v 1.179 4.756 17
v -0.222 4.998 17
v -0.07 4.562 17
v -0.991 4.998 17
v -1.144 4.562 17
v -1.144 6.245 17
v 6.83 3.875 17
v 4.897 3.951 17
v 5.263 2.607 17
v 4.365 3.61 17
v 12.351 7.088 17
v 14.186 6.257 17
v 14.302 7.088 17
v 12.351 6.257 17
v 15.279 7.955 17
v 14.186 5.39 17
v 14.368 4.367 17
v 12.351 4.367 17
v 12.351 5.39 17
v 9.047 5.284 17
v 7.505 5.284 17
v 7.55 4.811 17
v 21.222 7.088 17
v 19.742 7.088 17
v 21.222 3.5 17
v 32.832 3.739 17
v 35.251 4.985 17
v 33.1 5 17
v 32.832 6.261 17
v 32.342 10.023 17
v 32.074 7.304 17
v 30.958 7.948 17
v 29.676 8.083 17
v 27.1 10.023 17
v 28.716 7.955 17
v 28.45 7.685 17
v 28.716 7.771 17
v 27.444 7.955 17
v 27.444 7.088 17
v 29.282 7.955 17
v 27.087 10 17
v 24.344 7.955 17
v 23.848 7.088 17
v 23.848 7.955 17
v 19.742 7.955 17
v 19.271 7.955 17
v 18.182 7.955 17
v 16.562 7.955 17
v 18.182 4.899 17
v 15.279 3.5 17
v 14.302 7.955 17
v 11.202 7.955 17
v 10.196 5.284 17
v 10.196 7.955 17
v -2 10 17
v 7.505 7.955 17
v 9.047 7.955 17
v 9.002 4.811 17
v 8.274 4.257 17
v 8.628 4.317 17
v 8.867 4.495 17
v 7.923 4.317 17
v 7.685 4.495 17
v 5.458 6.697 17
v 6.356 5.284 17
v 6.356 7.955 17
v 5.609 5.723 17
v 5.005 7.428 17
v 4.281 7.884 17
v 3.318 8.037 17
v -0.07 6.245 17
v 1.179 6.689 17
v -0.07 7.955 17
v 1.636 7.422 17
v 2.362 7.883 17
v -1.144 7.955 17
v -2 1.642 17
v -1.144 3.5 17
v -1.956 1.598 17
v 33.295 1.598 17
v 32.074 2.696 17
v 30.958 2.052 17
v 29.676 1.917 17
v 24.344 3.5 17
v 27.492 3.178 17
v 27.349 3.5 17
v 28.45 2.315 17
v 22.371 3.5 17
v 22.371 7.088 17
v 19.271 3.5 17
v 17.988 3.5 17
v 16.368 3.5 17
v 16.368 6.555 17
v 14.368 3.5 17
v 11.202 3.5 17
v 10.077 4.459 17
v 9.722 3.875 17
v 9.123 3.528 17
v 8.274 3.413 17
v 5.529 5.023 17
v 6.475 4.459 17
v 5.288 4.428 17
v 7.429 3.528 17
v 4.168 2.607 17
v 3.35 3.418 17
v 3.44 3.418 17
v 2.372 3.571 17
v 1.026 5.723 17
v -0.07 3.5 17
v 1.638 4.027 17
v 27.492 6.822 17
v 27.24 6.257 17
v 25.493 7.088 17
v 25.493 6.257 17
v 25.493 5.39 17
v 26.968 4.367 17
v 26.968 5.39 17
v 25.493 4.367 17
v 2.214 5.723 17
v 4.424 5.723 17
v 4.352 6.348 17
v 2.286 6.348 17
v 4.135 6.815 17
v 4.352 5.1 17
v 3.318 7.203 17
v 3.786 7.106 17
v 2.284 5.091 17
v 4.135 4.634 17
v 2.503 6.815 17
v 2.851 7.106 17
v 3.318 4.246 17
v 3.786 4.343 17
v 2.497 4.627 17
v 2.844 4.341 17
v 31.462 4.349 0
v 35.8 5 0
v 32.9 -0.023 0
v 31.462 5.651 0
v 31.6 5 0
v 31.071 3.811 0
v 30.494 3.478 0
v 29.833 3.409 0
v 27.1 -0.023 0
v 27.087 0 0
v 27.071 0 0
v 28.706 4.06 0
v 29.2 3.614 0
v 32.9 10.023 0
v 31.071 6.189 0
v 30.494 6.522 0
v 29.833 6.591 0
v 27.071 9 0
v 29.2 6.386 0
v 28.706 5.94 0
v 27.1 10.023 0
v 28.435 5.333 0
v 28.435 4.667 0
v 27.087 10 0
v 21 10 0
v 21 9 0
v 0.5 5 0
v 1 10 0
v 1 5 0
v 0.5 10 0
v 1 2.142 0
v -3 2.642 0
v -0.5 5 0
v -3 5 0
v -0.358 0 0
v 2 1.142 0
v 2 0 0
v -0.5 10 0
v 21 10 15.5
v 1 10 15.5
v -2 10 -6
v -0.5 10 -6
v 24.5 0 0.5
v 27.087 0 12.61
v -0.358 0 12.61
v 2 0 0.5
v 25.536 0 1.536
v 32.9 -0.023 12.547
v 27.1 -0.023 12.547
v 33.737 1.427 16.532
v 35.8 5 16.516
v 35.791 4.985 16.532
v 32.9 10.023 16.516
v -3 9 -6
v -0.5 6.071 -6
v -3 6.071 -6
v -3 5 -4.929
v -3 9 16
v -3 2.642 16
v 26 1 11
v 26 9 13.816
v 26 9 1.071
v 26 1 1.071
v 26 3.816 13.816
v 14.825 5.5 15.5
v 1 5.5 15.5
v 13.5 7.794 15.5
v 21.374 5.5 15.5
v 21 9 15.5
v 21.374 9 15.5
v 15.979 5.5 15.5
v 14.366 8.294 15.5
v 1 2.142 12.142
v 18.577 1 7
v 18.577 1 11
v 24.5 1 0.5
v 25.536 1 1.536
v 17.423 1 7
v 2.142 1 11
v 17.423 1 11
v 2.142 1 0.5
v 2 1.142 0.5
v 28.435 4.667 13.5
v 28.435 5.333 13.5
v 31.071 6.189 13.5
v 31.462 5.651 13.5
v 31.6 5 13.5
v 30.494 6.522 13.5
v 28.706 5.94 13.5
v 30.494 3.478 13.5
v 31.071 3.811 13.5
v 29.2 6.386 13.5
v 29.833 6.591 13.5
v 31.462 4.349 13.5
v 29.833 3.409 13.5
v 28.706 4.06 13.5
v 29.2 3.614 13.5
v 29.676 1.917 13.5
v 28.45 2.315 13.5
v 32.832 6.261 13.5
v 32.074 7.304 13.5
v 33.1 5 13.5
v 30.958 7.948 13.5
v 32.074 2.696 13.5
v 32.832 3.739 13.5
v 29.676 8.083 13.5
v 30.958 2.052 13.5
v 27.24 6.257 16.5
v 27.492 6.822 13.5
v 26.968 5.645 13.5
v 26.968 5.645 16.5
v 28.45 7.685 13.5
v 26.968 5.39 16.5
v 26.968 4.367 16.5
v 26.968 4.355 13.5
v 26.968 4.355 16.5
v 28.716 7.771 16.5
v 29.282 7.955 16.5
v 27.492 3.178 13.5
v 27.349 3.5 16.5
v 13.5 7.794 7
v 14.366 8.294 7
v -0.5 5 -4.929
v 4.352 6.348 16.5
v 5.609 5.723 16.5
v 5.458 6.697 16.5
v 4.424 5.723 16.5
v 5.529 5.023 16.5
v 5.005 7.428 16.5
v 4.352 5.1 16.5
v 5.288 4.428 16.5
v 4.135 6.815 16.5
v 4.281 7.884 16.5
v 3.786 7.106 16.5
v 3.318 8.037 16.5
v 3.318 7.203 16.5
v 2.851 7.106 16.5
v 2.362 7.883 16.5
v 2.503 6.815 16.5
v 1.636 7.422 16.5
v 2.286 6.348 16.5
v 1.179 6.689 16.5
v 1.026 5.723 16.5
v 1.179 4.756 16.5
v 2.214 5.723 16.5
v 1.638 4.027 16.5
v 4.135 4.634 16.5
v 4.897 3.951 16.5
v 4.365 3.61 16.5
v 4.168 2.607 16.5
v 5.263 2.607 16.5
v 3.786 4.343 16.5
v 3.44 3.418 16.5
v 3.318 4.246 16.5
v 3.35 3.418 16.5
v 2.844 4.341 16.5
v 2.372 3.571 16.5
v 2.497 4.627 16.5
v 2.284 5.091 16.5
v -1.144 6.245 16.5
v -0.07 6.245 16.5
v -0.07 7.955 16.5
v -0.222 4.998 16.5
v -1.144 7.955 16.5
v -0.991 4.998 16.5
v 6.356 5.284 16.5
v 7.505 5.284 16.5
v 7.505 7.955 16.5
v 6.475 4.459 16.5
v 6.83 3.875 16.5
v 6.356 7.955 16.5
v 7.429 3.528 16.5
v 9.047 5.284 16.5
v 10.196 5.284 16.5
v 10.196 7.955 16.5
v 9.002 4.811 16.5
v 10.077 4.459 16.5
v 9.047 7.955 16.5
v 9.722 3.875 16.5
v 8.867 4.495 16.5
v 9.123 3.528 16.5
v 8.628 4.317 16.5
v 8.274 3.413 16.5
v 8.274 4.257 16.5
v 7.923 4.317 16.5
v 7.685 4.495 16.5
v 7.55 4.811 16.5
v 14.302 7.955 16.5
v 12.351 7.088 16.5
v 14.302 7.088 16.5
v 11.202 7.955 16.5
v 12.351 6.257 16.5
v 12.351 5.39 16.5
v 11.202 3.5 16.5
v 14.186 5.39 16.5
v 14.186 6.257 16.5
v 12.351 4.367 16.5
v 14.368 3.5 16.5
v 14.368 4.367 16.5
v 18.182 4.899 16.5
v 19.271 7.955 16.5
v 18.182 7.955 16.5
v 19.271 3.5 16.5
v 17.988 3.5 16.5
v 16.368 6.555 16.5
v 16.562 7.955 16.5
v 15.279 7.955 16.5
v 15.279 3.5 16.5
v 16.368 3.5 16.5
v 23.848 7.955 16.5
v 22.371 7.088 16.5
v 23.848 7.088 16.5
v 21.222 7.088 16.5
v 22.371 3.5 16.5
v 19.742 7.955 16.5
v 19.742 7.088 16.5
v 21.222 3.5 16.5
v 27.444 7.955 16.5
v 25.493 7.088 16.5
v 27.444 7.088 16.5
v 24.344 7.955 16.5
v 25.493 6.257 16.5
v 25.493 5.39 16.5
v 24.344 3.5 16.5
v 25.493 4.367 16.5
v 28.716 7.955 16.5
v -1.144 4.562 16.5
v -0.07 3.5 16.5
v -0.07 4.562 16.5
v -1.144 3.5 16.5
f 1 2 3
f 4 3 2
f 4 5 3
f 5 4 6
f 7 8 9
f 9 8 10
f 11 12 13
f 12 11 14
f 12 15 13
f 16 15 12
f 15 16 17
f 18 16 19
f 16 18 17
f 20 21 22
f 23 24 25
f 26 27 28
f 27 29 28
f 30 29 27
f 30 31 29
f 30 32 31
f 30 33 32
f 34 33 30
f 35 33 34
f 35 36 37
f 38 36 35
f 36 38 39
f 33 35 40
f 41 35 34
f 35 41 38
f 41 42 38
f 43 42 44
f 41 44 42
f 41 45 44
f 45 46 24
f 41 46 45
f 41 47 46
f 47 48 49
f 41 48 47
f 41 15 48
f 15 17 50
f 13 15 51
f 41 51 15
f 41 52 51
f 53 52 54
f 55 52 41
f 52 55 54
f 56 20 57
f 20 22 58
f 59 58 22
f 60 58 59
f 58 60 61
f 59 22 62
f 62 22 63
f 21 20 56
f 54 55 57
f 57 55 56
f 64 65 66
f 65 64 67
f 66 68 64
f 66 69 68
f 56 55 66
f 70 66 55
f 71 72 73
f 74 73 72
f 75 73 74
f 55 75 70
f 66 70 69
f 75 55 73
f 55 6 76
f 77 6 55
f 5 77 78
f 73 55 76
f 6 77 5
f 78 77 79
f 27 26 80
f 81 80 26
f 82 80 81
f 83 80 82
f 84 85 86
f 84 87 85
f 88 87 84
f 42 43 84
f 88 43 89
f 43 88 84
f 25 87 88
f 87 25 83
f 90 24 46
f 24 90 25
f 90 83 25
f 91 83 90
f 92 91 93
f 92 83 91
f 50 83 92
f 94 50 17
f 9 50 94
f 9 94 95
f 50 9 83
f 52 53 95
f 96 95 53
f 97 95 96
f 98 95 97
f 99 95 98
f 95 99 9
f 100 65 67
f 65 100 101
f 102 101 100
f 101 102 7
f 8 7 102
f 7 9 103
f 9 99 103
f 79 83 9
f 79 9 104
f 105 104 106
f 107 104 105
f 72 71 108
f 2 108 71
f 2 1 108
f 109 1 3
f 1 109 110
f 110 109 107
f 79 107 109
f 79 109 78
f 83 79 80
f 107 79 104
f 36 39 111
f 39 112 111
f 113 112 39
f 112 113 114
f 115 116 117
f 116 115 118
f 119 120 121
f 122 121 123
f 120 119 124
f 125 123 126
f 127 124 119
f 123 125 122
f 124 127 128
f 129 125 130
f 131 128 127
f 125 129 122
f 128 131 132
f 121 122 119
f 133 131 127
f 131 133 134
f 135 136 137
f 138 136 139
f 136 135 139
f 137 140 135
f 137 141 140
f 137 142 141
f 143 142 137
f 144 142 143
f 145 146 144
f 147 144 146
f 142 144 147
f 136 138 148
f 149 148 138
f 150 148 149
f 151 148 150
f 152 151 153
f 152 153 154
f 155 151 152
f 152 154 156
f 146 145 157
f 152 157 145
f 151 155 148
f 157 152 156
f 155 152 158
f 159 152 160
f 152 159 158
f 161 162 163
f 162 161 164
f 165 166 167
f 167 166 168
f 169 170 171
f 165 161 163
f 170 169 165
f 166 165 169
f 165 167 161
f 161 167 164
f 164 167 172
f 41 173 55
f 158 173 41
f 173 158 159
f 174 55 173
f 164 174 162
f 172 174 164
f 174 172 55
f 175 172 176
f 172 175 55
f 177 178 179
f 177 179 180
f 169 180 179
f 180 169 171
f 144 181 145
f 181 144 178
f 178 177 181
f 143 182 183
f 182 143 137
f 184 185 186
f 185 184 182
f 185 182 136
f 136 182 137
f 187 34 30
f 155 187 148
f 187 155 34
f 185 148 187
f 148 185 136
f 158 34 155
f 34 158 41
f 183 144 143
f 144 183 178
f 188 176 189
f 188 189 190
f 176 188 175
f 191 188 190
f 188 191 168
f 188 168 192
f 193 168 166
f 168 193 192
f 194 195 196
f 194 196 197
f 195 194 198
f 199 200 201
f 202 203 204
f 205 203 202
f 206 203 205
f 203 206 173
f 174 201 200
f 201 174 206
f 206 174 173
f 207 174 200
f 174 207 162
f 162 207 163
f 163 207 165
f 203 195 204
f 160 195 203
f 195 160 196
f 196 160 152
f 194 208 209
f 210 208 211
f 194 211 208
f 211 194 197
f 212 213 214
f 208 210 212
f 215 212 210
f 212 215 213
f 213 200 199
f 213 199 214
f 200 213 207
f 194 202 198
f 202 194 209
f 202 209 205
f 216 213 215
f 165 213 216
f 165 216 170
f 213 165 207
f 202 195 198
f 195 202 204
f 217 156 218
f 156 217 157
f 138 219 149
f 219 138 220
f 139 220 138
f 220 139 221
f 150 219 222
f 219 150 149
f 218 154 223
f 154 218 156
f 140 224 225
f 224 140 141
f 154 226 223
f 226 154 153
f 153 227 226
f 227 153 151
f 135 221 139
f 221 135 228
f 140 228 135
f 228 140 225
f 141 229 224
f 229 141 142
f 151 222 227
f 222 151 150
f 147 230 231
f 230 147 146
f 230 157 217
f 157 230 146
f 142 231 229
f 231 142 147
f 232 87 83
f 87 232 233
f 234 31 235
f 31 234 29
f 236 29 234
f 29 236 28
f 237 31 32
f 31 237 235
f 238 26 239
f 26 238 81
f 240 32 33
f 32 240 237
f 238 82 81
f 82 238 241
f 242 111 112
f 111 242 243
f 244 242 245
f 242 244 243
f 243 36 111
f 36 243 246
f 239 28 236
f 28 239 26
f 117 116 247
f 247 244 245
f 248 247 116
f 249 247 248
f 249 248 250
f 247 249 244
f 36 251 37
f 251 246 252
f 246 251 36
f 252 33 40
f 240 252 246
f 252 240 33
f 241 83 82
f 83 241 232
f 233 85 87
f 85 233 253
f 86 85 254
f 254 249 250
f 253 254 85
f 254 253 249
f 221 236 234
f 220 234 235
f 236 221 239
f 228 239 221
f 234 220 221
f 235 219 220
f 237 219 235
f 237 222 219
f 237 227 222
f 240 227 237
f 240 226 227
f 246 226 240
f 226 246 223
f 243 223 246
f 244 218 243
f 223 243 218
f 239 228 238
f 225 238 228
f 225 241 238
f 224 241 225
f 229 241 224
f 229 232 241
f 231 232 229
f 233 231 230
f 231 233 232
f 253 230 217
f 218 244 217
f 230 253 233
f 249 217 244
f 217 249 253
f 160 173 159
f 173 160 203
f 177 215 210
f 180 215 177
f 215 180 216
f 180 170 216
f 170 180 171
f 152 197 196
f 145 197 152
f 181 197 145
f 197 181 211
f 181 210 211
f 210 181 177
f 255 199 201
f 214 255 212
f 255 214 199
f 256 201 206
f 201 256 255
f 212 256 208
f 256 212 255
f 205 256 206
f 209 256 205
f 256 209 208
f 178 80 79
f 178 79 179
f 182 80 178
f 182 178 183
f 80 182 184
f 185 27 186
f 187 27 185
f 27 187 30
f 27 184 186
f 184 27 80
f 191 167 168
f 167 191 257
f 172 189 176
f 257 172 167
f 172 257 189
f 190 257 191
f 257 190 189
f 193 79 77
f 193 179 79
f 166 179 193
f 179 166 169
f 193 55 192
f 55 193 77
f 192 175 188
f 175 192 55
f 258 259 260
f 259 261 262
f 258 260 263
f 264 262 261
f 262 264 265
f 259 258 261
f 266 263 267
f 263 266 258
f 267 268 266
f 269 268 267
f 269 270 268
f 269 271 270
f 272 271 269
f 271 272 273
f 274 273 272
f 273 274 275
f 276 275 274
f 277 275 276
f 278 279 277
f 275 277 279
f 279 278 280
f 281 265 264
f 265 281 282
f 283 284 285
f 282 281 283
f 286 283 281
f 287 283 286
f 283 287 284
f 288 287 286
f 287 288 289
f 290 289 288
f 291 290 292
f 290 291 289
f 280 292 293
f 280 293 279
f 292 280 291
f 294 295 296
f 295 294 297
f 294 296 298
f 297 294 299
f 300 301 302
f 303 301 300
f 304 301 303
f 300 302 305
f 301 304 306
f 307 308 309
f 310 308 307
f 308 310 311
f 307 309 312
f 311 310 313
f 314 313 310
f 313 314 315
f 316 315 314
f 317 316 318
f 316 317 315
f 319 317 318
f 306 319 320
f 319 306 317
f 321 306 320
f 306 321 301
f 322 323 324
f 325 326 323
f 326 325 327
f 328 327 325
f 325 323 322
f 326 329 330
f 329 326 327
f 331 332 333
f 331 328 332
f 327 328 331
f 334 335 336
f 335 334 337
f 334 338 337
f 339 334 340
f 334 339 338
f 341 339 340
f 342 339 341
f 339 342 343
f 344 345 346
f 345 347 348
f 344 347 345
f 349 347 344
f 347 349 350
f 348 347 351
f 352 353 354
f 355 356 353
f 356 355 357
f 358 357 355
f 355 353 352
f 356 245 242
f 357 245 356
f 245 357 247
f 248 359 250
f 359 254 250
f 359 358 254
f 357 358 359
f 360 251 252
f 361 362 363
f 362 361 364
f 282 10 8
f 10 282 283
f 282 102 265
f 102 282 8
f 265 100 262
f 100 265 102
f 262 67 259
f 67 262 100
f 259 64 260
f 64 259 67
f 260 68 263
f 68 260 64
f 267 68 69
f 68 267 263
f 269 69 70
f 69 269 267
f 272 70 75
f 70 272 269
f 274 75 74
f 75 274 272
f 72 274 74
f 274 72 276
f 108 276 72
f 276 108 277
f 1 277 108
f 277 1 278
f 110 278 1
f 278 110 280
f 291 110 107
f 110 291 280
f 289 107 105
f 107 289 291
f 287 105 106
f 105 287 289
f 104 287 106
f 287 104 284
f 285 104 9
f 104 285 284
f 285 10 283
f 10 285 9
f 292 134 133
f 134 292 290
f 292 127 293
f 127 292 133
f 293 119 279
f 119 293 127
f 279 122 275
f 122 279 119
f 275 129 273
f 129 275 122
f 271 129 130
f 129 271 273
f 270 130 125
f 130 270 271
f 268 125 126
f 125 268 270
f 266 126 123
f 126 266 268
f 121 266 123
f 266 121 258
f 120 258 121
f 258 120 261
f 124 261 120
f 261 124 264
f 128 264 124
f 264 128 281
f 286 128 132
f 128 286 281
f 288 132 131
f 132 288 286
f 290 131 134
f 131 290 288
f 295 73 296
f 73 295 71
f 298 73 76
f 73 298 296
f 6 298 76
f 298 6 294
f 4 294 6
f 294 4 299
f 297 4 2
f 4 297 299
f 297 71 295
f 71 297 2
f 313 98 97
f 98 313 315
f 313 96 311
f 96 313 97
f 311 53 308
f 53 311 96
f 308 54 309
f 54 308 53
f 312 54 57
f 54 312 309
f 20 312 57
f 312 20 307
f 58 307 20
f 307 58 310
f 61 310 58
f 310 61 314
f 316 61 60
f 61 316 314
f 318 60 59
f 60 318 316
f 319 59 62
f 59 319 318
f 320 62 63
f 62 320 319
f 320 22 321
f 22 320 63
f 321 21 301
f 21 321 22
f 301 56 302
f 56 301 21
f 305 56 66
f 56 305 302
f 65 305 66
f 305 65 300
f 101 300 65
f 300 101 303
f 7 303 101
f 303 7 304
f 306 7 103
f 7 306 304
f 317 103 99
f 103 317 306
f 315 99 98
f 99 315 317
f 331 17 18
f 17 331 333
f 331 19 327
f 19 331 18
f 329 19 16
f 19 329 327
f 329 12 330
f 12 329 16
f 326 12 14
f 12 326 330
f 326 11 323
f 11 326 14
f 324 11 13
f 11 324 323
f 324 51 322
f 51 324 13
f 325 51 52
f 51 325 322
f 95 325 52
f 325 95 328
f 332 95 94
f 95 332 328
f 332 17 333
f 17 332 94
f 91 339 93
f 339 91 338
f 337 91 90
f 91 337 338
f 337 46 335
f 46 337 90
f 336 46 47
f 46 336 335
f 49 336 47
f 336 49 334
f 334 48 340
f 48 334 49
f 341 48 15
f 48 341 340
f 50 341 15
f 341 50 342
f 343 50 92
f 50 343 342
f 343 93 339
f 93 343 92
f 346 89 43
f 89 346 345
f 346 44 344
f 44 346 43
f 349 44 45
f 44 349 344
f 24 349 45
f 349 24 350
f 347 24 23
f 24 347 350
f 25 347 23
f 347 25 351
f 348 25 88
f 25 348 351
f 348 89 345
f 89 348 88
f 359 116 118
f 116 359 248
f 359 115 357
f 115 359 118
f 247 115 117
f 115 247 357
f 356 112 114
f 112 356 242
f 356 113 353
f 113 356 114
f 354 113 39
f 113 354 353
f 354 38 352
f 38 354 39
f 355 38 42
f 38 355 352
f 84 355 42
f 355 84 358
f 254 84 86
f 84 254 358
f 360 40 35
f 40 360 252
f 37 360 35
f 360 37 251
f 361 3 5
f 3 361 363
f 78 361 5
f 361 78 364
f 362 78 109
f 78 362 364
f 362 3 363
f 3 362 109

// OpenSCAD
//Carbon i3 Modified

module fan_nozzle(){
    
difference(){    
union(){
cube([32,10,17]); // Main cube
translate([30,5,0])cylinder(r=5.8,h = 17, $fn=6);    
translate([-3,0,-6]) cube([3,10,23]);
//#translate([-2,5,0])cylinder(r=5.8,h = 17, $fn=6);        
}
// Mounting screw
translate([30,5,-10])cylinder(r=3.2/2,h = 24.5-0.2, $fn=15); // Screw cut
translate([30,5,17-3.5])cylinder(r=3.1,h = 20, $fn=15); // head cut

//#translate([-2,5,-10])cylinder(r=3.2/2,h = 24.5-0.2, $fn=15); // Screw cut
//#translate([-2,5,17-3.5])cylinder(r=3.1,h = 20, $fn=15); // head cut

// Fan entry hole
translate([1,10-1.5,-1])cube([20,3,16.5]);
translate([1,10-1.5,-1-5])cube([18,3,16.5]);
    
// Airway cutout
difference(){    
translate([1,1,-1])cube([25,8,16.5]);    
translate([0,0,10])rotate([45,0,0])cube([30,8,16.5]);    
translate([-1,-10,-1])rotate([0,0,45])cube([10,8,30]); 
translate([20,0,16])rotate([0,20,0])cube([10,20,10]);    
}
translate([2,-1,-4.5])cube([24,3,5]);
//#translate([-2,-1,-2])rotate([0,45,0])cube([5,10,5]);
translate([22,-1,-2])rotate([0,45,0])cube([5,10,5]);
    
}

// Air director
translate([18,0,7])rotate([0,0,30])cube([1,9,10]);


}

module fancy_corners(){
    
    translate([-10,-10.5,13])rotate([-20,0,0])cube([50,10,15]);
    translate([-16,-10.5,17.5])rotate([0,45,0])cube([10,30,15]);
    
    translate([46.5,-10.5,15])rotate([0,-45,30])cube([10,30,15]);
    translate([28.62,-10.5,15])rotate([0,-45,-30])cube([10,30,15]);

    translate([-5,-1,-7])rotate([0,0,0]) cube([10,6,7]);
    translate([-0.5,-1,-7])rotate([0,0,0]) cube([1,15,7]);
    translate([-5,4,-11])rotate([45,0,0]) cube([10,5,5]);

    //left cut
    translate([-6.5,-8,-5])rotate([0,0,45])cube([10,10,45]);
    translate([-7,-5,12])rotate([0,-45,0])cube([10,30,15]);
    
    translate([-7,5,-10])rotate([0,0,45])cube([10,10,35]);
    
    }

module fan_n(){
difference(){
fan_nozzle();
fancy_corners();    
translate([-2.0,3.5,16.5])linear_extrude(height = 0.6) {text("!QUENTE!", size = 4.4, font = "Helvetica Neue:style=Bold");}
}
}
fan_n();
